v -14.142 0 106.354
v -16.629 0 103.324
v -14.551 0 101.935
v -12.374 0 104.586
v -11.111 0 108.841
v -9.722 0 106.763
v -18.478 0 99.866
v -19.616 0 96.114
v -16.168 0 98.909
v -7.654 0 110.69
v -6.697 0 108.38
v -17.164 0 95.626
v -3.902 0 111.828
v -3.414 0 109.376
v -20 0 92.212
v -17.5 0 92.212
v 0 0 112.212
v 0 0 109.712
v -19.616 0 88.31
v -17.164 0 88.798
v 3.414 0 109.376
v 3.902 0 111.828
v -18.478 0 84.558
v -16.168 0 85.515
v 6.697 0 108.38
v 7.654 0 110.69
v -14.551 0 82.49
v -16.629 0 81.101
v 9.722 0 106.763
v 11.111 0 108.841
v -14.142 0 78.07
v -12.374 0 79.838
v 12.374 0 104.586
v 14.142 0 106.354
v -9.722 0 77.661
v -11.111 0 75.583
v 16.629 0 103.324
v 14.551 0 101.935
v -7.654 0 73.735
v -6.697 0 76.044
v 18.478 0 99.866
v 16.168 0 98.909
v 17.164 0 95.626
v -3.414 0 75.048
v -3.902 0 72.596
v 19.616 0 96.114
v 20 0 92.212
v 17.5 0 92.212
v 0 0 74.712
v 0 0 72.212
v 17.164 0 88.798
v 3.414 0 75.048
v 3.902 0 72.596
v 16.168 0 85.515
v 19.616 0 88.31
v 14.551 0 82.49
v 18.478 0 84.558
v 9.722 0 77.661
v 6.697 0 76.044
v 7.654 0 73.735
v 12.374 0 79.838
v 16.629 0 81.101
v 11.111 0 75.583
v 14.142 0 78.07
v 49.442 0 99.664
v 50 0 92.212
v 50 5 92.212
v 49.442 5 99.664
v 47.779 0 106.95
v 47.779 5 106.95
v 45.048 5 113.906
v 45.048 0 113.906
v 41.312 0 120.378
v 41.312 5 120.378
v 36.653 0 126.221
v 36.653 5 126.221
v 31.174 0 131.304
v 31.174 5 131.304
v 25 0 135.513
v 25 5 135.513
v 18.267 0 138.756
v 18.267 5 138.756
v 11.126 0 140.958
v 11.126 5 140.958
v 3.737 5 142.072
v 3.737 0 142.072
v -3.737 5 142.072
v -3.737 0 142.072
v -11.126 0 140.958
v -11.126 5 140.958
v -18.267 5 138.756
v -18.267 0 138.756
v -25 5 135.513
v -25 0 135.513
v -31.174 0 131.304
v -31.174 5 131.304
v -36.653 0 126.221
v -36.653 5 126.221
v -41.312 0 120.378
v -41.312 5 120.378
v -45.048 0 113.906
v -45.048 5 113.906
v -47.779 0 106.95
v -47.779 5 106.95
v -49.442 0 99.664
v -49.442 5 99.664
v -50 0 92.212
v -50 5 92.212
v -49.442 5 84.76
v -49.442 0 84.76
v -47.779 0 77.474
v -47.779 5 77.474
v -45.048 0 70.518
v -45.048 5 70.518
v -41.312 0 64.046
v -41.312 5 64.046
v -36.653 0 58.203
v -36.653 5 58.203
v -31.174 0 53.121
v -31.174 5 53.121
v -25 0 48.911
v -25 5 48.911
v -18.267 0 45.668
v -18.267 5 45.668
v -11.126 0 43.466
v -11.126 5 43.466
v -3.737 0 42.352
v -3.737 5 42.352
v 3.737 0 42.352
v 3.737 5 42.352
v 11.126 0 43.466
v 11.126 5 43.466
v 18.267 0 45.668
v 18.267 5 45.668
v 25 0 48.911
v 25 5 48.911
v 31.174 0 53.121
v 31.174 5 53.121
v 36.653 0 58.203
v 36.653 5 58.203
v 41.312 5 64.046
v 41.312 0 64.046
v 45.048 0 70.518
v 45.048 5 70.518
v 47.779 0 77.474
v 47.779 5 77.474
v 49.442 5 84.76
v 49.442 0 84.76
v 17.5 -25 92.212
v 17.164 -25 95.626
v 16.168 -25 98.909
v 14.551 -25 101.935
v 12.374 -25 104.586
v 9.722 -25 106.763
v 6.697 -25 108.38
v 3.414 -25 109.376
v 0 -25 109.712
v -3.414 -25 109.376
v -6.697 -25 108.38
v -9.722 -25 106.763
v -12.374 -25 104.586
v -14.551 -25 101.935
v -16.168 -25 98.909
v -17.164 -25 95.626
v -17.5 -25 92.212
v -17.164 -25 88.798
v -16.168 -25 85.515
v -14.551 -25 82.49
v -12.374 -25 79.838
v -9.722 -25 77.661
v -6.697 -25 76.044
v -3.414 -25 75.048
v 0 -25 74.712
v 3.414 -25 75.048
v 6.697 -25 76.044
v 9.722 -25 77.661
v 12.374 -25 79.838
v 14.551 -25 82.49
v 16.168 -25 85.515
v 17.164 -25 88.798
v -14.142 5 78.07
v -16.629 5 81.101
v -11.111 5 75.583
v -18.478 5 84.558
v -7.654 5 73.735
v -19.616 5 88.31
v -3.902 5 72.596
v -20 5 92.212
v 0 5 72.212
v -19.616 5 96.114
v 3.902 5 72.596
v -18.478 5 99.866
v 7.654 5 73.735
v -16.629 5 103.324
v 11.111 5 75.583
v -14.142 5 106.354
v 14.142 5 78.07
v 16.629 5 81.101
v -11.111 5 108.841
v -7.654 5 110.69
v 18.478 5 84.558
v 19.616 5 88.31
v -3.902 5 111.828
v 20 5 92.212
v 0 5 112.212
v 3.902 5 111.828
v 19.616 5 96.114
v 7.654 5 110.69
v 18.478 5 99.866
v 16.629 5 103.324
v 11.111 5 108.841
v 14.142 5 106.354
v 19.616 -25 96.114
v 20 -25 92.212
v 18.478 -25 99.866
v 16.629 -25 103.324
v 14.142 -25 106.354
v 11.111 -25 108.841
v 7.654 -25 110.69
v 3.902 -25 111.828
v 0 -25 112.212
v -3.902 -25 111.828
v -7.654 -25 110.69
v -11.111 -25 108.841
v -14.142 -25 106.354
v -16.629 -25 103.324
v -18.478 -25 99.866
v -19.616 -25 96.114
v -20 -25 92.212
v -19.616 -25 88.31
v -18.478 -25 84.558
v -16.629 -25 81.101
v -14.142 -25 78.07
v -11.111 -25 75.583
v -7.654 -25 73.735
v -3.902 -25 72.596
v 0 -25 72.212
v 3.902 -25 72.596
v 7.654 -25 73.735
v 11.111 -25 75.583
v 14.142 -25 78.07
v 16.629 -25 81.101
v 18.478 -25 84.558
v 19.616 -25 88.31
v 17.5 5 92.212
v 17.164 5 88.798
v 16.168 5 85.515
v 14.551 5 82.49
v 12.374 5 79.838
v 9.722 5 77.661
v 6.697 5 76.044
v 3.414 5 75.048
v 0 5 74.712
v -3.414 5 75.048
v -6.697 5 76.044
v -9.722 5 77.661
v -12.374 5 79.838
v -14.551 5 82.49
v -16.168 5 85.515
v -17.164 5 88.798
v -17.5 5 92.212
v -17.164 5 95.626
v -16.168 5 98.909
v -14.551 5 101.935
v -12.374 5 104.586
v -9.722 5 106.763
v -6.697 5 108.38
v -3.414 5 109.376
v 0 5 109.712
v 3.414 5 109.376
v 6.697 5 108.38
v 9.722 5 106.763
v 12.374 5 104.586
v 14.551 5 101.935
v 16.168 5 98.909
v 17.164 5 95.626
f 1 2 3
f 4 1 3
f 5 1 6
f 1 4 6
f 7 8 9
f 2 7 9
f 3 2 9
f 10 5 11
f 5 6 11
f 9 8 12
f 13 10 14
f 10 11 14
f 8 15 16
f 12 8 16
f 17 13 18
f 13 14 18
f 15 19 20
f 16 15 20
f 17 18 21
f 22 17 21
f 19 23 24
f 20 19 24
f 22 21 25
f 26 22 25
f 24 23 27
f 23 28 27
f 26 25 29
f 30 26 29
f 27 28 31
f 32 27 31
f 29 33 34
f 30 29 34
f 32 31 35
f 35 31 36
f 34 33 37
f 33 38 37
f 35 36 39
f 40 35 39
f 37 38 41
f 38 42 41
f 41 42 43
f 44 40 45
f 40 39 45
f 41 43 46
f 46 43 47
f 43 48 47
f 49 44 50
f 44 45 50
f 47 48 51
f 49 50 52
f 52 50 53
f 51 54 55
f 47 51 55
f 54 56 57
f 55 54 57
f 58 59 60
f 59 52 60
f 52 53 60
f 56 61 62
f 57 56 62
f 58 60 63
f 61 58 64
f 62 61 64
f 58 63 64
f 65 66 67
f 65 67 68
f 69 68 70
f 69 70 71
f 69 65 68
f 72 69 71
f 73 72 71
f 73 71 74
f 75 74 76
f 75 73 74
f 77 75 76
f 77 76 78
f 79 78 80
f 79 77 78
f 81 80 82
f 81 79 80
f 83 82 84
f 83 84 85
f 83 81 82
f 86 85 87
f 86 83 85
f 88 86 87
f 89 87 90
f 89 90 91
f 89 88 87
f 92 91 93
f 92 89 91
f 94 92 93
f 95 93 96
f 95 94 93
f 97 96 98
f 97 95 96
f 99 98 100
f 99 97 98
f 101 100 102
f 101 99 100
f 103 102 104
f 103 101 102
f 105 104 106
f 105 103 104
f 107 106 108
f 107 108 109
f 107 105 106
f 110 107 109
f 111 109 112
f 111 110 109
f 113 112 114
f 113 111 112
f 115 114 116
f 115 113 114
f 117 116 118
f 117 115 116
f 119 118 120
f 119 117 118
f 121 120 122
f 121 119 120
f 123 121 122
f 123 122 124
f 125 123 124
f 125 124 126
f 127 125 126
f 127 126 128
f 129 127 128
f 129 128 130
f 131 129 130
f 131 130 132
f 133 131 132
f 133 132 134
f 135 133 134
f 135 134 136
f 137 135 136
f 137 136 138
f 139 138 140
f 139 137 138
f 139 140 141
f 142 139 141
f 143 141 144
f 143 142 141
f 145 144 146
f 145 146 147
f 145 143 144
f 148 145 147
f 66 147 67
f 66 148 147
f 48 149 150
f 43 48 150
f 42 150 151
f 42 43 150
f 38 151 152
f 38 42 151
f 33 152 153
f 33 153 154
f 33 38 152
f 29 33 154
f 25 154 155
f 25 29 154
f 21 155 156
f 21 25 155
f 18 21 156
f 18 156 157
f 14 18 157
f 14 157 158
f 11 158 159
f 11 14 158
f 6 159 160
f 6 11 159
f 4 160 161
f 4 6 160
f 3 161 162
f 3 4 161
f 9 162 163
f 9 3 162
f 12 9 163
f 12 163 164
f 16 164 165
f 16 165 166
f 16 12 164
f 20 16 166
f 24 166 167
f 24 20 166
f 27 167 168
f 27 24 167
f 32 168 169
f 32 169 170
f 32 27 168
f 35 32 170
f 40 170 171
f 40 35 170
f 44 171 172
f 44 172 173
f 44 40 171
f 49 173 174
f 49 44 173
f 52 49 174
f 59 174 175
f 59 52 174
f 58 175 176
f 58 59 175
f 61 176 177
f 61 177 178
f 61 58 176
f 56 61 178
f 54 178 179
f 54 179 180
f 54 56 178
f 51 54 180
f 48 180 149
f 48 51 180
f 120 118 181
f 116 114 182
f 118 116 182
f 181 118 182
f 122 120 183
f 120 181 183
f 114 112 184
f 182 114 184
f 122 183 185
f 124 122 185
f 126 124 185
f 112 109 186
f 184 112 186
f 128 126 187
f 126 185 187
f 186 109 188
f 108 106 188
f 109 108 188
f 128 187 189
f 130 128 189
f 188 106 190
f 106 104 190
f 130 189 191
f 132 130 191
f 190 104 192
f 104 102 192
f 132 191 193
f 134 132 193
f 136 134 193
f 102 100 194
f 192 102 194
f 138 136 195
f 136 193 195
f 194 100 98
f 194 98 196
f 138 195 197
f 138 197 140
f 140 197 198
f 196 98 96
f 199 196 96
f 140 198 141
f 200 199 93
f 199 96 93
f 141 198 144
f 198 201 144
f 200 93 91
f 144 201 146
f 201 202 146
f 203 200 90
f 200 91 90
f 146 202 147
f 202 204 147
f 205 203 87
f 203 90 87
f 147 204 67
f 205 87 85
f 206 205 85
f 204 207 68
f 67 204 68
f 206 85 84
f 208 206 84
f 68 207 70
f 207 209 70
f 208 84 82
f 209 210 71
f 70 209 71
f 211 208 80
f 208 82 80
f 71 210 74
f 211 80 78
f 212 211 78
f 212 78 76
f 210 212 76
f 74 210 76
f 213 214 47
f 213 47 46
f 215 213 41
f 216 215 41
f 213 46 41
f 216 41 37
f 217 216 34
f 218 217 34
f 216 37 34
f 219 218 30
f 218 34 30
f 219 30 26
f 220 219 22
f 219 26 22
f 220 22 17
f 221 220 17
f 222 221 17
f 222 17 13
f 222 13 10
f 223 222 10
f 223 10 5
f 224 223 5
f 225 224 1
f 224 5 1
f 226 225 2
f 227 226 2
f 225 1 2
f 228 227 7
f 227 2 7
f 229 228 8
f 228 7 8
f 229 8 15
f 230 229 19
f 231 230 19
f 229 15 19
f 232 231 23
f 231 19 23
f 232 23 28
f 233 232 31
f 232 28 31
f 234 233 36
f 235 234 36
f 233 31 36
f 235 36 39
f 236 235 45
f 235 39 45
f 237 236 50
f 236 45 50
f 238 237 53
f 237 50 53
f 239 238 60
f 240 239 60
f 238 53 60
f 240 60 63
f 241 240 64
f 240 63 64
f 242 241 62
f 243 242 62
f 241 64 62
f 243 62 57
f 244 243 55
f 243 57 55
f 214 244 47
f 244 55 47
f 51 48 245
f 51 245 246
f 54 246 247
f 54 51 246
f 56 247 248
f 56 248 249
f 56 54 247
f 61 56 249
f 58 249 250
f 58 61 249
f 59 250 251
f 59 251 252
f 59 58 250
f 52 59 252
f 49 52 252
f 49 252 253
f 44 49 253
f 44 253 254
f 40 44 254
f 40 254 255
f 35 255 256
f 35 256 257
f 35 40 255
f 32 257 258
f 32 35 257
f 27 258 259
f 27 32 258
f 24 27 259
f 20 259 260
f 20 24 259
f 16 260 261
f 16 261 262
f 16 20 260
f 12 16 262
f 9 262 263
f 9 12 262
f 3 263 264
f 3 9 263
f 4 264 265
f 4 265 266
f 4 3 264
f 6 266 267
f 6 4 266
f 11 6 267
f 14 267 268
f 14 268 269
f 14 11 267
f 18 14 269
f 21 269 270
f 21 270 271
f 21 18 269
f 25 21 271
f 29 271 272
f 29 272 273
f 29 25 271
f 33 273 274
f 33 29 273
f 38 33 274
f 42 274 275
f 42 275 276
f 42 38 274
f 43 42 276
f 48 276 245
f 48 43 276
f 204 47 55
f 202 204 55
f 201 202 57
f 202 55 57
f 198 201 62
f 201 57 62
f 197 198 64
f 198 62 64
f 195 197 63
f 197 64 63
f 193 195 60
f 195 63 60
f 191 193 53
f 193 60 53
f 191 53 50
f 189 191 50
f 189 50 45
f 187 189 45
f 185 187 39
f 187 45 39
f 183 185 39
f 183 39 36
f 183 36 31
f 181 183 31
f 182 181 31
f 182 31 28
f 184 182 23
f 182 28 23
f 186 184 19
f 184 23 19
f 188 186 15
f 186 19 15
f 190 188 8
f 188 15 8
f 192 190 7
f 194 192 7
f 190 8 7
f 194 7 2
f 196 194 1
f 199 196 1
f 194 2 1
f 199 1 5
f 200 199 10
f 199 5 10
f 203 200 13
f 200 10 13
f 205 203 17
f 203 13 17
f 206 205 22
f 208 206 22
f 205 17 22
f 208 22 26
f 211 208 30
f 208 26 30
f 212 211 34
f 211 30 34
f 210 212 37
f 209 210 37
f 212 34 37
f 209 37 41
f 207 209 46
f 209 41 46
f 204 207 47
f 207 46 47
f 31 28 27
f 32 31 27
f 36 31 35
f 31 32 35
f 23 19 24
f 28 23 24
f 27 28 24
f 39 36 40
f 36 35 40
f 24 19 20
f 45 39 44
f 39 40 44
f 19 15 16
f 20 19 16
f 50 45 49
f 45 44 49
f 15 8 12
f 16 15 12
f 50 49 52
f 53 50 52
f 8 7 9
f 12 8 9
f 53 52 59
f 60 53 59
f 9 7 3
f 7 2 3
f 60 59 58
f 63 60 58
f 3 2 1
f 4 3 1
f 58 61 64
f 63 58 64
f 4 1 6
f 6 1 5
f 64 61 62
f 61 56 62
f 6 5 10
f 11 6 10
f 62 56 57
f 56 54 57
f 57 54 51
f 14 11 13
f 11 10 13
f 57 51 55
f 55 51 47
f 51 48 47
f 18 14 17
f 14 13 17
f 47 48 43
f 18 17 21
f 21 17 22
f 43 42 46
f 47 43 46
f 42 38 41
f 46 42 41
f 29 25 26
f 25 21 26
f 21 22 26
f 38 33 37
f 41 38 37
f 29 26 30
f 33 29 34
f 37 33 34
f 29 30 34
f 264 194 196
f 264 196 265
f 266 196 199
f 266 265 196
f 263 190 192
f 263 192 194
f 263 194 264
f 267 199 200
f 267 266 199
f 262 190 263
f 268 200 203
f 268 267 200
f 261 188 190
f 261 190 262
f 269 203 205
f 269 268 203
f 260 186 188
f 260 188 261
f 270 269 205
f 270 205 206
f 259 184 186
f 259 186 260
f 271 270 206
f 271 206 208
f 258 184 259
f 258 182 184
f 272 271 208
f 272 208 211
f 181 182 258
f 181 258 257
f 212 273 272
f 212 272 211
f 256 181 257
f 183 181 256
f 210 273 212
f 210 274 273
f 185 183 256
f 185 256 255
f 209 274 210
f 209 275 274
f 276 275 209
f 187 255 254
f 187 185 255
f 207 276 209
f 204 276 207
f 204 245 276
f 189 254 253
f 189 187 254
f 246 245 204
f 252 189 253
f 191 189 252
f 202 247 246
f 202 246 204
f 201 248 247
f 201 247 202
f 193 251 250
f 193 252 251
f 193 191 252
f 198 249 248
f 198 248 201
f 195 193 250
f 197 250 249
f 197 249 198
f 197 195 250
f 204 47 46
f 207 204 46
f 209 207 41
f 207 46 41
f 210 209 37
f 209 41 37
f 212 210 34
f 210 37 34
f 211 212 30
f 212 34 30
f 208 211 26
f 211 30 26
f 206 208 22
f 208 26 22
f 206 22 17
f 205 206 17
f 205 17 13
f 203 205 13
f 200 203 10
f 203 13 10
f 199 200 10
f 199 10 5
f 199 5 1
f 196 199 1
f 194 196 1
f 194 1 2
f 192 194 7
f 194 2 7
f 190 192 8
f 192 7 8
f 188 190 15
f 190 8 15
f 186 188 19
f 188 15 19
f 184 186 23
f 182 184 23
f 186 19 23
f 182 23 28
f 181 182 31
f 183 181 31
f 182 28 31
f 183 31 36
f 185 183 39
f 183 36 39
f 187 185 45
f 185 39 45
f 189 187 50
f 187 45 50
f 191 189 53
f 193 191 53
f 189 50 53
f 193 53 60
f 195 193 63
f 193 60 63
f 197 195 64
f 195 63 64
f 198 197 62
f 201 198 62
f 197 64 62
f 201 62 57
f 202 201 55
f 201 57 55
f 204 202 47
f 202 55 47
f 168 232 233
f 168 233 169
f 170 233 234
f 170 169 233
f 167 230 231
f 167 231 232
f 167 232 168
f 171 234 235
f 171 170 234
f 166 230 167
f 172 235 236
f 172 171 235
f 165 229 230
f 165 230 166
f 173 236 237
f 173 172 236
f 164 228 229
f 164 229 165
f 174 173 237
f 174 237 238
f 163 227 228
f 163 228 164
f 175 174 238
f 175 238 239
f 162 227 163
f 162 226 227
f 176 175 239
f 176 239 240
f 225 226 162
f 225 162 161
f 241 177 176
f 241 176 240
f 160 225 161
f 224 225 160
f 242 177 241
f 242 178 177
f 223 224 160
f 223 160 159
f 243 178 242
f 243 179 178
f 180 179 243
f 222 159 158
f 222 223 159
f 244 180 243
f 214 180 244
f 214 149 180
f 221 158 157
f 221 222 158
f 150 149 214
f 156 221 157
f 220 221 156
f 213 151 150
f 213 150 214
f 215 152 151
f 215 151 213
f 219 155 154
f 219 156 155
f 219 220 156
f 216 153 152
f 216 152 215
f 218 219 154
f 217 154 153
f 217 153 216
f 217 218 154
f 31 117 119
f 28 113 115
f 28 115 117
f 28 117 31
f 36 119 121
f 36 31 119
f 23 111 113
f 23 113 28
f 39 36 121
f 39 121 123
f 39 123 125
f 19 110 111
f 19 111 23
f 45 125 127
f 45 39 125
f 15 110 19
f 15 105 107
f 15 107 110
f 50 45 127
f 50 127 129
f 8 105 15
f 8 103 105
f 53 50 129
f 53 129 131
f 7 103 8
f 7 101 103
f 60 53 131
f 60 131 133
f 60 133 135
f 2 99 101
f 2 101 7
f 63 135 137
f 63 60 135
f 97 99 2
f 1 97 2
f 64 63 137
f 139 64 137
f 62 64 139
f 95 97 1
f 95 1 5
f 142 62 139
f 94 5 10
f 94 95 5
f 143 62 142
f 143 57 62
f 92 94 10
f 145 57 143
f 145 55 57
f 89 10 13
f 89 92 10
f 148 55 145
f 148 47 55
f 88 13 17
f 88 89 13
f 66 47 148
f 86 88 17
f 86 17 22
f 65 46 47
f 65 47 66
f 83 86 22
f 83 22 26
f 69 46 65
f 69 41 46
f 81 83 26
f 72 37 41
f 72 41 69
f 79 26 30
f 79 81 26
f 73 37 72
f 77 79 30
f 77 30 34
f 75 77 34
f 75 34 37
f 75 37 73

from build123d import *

# Parameters (mm, degrees)
F0_R        = 20
F0_R_2      = 17.5
F1_DEPTH    = 25
F0_R_3      = 50
F2_DEPTH    = 5
F1_FACE_R   = 20
F1_FACE_R_2 = 17.5
F3_DEPTH    = 5


with BuildPart() as f1:
    # F0 (on Front) → F1 (new body)
    with BuildSketch(Plane.XZ):
        with Locations((0, 92.212098)):
            Circle(F0_R)
        with Locations((0, 92.212098)):
            Circle(F0_R_2, mode=Mode.SUBTRACT)
    extrude(amount=F1_DEPTH)


with BuildPart() as f2:
    # F0 (on Front) → F2 (new body)
    with BuildSketch(Plane.XZ):
        with Locations((0, 92.212098)):
            Circle(F0_R_3)
        with Locations((0, 92.212098)):
            Circle(F0_R, mode=Mode.SUBTRACT)
    extrude(amount=-F2_DEPTH)


with BuildPart() as f3:
    # F1_face (on face) → F3 (new body)
    with BuildSketch(Plane(origin=(0, 0, 92.212098), x_dir=(1, 0, 0), z_dir=(0, 1, 0))):
        Circle(F1_FACE_R)
        Circle(F1_FACE_R_2, mode=Mode.SUBTRACT)
    extrude(amount=F3_DEPTH)


solid = Compound([f1.part, f2.part, f3.part])
